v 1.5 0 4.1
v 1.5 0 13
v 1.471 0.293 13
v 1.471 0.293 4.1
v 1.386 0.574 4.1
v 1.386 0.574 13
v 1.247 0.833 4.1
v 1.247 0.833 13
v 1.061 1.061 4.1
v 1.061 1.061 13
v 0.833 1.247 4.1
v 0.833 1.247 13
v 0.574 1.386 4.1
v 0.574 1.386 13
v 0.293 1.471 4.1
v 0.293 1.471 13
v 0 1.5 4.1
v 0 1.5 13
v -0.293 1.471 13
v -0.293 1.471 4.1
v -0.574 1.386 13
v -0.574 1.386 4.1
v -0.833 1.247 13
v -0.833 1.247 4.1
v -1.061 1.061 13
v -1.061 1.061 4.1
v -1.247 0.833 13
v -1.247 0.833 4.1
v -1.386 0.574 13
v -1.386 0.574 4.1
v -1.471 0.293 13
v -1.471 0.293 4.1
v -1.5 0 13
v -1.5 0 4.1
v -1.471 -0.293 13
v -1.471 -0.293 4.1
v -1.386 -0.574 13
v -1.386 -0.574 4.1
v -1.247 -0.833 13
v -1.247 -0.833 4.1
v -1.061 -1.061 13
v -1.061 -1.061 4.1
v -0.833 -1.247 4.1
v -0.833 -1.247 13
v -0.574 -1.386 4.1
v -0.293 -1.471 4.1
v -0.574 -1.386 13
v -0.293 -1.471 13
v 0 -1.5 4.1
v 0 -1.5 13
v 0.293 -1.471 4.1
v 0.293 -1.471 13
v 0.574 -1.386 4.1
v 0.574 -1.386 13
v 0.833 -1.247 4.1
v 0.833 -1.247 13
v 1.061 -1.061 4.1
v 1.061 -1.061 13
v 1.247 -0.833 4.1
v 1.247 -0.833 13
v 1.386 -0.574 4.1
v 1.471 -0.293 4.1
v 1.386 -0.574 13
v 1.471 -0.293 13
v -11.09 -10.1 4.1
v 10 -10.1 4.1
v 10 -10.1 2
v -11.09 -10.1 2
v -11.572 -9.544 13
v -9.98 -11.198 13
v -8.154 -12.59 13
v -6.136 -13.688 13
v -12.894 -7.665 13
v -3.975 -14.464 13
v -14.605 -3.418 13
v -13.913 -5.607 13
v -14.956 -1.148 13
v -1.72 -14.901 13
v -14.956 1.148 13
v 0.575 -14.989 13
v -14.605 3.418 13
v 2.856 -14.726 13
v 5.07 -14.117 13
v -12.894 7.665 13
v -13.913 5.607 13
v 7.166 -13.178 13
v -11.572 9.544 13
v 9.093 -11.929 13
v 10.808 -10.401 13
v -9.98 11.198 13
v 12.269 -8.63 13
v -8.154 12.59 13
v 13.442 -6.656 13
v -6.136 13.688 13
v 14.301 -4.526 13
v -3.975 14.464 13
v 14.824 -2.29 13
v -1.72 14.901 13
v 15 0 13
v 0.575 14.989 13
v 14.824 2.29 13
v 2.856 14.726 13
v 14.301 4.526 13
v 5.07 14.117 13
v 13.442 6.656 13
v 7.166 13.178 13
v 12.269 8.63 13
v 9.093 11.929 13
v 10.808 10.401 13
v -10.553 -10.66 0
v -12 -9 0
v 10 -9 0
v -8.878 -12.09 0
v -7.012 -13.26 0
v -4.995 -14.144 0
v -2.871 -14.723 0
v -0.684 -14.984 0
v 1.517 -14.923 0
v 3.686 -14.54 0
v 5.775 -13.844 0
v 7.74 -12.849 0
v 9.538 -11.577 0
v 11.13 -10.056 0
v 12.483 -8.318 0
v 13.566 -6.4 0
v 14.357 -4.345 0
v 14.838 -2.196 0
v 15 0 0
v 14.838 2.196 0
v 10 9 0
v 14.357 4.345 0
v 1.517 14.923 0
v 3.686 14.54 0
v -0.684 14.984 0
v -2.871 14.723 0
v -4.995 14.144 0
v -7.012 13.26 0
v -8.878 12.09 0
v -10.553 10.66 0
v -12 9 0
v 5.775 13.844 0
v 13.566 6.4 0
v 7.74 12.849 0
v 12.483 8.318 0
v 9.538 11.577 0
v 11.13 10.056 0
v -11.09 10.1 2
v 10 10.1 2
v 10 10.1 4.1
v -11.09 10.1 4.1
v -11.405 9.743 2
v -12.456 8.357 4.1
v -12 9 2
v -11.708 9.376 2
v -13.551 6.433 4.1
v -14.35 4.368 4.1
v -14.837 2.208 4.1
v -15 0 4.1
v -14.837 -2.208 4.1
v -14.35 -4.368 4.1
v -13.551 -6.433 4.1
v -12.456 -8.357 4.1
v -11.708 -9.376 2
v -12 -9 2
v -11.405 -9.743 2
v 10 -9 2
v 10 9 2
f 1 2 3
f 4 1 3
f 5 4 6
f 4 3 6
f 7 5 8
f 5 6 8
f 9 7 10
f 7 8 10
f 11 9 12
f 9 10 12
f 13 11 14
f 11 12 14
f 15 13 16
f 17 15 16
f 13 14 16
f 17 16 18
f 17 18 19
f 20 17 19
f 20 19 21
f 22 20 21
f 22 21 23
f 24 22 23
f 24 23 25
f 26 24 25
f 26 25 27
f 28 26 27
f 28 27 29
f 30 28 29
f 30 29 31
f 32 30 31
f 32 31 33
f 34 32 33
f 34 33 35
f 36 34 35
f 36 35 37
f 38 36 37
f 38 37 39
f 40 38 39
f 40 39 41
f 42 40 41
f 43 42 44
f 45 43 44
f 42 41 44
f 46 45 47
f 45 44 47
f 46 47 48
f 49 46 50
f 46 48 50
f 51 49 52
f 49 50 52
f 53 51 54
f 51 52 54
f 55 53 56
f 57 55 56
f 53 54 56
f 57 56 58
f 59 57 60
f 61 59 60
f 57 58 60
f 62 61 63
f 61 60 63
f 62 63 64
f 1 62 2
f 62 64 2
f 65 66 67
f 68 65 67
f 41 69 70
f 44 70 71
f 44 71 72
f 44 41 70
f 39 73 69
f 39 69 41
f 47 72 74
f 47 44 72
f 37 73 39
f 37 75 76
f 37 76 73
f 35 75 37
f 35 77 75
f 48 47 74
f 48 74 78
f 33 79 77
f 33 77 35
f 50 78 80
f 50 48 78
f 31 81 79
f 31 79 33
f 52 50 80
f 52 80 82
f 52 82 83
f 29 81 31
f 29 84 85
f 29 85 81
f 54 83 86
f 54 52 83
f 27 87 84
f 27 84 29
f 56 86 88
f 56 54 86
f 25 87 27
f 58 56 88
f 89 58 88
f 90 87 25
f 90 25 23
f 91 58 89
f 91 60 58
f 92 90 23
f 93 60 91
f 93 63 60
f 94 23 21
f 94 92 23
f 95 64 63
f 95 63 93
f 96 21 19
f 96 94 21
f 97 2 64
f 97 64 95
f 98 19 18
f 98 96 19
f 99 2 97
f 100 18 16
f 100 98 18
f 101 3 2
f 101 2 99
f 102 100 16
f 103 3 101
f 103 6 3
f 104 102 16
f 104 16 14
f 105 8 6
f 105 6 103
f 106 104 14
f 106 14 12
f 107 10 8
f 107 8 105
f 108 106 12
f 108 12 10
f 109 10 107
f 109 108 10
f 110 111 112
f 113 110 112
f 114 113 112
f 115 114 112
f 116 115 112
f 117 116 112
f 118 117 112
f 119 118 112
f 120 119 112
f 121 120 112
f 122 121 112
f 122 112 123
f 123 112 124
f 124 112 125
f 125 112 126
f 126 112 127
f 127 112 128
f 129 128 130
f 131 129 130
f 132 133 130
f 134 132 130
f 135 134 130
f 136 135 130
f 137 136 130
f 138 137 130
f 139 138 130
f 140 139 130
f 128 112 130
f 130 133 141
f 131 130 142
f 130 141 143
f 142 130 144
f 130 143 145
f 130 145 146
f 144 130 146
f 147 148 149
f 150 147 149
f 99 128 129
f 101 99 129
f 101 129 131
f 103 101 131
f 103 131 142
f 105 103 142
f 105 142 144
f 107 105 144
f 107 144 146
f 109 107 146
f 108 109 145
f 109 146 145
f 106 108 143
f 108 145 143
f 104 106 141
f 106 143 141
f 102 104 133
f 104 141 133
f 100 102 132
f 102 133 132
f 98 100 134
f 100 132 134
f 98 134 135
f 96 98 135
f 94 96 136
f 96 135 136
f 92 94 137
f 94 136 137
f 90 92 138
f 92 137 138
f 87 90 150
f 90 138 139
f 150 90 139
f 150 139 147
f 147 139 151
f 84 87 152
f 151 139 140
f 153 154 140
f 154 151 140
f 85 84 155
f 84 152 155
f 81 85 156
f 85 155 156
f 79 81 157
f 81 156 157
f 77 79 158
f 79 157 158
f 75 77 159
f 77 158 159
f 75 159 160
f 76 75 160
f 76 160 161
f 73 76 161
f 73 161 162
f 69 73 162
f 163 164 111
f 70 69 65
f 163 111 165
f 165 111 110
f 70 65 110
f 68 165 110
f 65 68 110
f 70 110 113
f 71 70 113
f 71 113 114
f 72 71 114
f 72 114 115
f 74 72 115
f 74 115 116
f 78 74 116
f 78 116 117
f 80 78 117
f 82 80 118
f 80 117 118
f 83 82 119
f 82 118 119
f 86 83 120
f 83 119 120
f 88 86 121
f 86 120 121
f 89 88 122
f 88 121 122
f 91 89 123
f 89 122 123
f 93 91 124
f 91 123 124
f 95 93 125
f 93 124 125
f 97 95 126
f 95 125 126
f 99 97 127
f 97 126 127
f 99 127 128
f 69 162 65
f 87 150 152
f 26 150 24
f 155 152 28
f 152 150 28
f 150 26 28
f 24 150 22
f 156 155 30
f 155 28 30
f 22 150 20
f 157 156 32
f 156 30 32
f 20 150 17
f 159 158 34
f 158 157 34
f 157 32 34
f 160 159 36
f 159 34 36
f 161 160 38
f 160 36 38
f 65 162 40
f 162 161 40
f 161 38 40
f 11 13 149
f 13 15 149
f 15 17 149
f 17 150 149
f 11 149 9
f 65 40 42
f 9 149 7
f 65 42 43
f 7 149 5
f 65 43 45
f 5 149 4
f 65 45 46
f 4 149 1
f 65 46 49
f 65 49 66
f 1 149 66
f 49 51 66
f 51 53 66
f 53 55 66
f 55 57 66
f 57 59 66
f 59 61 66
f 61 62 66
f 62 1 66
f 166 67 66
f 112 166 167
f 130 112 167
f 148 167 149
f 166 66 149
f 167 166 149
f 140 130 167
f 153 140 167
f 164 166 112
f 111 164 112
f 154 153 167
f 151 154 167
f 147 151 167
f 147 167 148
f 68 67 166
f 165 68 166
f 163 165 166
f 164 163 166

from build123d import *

# Parameters (mm, degrees)
F0_R          = 15
F1_DEPTH      = 13
F3_DEPTH      = 25
F3_DEPTH_BACK = 10
F4_R          = 1.5
F5_DEPTH      = 13.001


with BuildPart() as f1:
    # F0 (on Top) → F1 (new body)
    with BuildSketch(Plane.XY):
        Circle(F0_R)
    extrude(amount=F1_DEPTH)

    # F2 (on Right) → F3 (cut, two sides)
    with BuildSketch(Plane.YZ) as f3_sk:
        Polygon((-9, 2), (-9, 0), (9, 0), (9, 2), (10.1, 2), (10.1, 4.1), (-10.1, 4.1), (-10.1, 2), align=None)
    extrude(amount=-F3_DEPTH, mode=Mode.SUBTRACT)
    extrude(f3_sk.sketch, amount=F3_DEPTH_BACK, mode=Mode.SUBTRACT)

    # F4 (on face) → F5 (cut, through all)
    with BuildSketch(Plane.XY.offset(13)):
        Circle(F4_R)
    extrude(amount=-F5_DEPTH, mode=Mode.SUBTRACT)


solid = f1.part
